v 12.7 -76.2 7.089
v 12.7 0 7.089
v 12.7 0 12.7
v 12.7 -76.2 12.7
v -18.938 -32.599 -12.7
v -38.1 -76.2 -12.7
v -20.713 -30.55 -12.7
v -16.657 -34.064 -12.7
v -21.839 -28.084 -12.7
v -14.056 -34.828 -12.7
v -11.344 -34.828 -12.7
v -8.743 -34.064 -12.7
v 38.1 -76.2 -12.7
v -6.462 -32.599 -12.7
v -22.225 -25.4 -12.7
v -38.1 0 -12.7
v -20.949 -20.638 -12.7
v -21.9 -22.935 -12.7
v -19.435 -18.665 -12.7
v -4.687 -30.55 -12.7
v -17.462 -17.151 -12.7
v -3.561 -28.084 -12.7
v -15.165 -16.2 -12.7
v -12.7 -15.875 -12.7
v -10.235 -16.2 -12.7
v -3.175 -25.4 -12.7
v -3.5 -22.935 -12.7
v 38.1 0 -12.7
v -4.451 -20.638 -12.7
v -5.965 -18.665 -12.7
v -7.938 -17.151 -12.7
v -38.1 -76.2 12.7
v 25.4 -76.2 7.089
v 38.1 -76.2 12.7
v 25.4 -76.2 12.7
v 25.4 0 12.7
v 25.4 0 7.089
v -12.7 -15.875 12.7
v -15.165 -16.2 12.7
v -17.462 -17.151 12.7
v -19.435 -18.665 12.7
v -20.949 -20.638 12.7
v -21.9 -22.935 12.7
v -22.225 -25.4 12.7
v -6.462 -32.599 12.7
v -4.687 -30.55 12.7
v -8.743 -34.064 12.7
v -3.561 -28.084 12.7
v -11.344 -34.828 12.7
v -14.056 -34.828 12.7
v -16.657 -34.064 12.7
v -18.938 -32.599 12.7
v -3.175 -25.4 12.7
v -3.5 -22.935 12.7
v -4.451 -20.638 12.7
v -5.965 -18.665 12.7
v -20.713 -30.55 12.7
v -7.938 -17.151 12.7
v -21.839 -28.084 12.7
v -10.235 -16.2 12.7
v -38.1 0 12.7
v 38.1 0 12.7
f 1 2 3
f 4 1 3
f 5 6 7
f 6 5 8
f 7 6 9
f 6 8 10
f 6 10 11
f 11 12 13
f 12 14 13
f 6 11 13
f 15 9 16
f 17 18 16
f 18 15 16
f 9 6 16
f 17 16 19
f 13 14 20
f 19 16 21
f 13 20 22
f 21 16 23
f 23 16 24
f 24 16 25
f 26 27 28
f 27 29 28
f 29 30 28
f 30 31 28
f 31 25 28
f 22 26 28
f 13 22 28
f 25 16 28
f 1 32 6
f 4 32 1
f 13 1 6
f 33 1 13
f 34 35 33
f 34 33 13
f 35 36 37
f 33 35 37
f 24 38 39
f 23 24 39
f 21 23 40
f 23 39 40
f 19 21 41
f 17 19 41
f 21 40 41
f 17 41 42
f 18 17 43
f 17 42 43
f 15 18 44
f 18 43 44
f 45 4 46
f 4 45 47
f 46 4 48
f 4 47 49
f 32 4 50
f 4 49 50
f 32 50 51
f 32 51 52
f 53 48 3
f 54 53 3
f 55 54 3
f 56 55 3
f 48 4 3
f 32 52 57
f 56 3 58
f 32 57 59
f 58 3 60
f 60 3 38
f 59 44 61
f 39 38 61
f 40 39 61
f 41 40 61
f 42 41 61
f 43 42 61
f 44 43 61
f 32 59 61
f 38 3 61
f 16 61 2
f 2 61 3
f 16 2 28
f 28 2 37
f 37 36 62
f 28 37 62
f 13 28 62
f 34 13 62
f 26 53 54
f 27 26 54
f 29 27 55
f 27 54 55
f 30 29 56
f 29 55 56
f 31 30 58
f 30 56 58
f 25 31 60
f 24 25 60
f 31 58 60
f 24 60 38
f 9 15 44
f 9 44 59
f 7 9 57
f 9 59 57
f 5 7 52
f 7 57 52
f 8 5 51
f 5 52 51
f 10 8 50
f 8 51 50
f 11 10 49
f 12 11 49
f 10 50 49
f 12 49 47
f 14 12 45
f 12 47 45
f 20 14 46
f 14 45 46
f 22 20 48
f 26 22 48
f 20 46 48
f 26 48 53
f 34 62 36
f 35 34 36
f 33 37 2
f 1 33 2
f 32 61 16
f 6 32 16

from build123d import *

# Parameters (mm, degrees)
F1_DEPTH = 76.2
F3_DEPTH = 25.4


with BuildPart() as f1:
    # F0 (on Front) → F1 (new body)
    with BuildSketch(Plane.XZ):
        Polygon((-38.1, -12.7), (38.1, -12.7), (38.1, 12.7), (25.4, 12.7), (25.4, 7.089494), (12.7, 7.089494), (12.7, 12.7), (-38.1, 12.7), align=None)
    extrude(amount=F1_DEPTH)

    # F2 (on face) → F3 (cut)
    with BuildSketch(Plane.XY.offset(12.7)):
        with BuildLine():
            ThreePointArc((-3.175, -25.4), (-5.964808, -18.664808), (-12.7, -15.875))
            Line((-12.7, -15.875), (-12.7, -25.4))
            Line((-12.7, -25.4), (-22.225, -25.4))
            ThreePointArc((-22.225, -25.4), (-12.7, -34.925), (-3.175, -25.4))
        make_face()
        with BuildLine():
            Line((-12.7, -25.4), (-12.7, -15.875))
            ThreePointArc((-12.7, -15.875), (-19.435192, -18.664808), (-22.225, -25.4))
            Line((-22.225, -25.4), (-12.7, -25.4))
        make_face()
    extrude(amount=-F3_DEPTH, mode=Mode.SUBTRACT)


solid = f1.part
